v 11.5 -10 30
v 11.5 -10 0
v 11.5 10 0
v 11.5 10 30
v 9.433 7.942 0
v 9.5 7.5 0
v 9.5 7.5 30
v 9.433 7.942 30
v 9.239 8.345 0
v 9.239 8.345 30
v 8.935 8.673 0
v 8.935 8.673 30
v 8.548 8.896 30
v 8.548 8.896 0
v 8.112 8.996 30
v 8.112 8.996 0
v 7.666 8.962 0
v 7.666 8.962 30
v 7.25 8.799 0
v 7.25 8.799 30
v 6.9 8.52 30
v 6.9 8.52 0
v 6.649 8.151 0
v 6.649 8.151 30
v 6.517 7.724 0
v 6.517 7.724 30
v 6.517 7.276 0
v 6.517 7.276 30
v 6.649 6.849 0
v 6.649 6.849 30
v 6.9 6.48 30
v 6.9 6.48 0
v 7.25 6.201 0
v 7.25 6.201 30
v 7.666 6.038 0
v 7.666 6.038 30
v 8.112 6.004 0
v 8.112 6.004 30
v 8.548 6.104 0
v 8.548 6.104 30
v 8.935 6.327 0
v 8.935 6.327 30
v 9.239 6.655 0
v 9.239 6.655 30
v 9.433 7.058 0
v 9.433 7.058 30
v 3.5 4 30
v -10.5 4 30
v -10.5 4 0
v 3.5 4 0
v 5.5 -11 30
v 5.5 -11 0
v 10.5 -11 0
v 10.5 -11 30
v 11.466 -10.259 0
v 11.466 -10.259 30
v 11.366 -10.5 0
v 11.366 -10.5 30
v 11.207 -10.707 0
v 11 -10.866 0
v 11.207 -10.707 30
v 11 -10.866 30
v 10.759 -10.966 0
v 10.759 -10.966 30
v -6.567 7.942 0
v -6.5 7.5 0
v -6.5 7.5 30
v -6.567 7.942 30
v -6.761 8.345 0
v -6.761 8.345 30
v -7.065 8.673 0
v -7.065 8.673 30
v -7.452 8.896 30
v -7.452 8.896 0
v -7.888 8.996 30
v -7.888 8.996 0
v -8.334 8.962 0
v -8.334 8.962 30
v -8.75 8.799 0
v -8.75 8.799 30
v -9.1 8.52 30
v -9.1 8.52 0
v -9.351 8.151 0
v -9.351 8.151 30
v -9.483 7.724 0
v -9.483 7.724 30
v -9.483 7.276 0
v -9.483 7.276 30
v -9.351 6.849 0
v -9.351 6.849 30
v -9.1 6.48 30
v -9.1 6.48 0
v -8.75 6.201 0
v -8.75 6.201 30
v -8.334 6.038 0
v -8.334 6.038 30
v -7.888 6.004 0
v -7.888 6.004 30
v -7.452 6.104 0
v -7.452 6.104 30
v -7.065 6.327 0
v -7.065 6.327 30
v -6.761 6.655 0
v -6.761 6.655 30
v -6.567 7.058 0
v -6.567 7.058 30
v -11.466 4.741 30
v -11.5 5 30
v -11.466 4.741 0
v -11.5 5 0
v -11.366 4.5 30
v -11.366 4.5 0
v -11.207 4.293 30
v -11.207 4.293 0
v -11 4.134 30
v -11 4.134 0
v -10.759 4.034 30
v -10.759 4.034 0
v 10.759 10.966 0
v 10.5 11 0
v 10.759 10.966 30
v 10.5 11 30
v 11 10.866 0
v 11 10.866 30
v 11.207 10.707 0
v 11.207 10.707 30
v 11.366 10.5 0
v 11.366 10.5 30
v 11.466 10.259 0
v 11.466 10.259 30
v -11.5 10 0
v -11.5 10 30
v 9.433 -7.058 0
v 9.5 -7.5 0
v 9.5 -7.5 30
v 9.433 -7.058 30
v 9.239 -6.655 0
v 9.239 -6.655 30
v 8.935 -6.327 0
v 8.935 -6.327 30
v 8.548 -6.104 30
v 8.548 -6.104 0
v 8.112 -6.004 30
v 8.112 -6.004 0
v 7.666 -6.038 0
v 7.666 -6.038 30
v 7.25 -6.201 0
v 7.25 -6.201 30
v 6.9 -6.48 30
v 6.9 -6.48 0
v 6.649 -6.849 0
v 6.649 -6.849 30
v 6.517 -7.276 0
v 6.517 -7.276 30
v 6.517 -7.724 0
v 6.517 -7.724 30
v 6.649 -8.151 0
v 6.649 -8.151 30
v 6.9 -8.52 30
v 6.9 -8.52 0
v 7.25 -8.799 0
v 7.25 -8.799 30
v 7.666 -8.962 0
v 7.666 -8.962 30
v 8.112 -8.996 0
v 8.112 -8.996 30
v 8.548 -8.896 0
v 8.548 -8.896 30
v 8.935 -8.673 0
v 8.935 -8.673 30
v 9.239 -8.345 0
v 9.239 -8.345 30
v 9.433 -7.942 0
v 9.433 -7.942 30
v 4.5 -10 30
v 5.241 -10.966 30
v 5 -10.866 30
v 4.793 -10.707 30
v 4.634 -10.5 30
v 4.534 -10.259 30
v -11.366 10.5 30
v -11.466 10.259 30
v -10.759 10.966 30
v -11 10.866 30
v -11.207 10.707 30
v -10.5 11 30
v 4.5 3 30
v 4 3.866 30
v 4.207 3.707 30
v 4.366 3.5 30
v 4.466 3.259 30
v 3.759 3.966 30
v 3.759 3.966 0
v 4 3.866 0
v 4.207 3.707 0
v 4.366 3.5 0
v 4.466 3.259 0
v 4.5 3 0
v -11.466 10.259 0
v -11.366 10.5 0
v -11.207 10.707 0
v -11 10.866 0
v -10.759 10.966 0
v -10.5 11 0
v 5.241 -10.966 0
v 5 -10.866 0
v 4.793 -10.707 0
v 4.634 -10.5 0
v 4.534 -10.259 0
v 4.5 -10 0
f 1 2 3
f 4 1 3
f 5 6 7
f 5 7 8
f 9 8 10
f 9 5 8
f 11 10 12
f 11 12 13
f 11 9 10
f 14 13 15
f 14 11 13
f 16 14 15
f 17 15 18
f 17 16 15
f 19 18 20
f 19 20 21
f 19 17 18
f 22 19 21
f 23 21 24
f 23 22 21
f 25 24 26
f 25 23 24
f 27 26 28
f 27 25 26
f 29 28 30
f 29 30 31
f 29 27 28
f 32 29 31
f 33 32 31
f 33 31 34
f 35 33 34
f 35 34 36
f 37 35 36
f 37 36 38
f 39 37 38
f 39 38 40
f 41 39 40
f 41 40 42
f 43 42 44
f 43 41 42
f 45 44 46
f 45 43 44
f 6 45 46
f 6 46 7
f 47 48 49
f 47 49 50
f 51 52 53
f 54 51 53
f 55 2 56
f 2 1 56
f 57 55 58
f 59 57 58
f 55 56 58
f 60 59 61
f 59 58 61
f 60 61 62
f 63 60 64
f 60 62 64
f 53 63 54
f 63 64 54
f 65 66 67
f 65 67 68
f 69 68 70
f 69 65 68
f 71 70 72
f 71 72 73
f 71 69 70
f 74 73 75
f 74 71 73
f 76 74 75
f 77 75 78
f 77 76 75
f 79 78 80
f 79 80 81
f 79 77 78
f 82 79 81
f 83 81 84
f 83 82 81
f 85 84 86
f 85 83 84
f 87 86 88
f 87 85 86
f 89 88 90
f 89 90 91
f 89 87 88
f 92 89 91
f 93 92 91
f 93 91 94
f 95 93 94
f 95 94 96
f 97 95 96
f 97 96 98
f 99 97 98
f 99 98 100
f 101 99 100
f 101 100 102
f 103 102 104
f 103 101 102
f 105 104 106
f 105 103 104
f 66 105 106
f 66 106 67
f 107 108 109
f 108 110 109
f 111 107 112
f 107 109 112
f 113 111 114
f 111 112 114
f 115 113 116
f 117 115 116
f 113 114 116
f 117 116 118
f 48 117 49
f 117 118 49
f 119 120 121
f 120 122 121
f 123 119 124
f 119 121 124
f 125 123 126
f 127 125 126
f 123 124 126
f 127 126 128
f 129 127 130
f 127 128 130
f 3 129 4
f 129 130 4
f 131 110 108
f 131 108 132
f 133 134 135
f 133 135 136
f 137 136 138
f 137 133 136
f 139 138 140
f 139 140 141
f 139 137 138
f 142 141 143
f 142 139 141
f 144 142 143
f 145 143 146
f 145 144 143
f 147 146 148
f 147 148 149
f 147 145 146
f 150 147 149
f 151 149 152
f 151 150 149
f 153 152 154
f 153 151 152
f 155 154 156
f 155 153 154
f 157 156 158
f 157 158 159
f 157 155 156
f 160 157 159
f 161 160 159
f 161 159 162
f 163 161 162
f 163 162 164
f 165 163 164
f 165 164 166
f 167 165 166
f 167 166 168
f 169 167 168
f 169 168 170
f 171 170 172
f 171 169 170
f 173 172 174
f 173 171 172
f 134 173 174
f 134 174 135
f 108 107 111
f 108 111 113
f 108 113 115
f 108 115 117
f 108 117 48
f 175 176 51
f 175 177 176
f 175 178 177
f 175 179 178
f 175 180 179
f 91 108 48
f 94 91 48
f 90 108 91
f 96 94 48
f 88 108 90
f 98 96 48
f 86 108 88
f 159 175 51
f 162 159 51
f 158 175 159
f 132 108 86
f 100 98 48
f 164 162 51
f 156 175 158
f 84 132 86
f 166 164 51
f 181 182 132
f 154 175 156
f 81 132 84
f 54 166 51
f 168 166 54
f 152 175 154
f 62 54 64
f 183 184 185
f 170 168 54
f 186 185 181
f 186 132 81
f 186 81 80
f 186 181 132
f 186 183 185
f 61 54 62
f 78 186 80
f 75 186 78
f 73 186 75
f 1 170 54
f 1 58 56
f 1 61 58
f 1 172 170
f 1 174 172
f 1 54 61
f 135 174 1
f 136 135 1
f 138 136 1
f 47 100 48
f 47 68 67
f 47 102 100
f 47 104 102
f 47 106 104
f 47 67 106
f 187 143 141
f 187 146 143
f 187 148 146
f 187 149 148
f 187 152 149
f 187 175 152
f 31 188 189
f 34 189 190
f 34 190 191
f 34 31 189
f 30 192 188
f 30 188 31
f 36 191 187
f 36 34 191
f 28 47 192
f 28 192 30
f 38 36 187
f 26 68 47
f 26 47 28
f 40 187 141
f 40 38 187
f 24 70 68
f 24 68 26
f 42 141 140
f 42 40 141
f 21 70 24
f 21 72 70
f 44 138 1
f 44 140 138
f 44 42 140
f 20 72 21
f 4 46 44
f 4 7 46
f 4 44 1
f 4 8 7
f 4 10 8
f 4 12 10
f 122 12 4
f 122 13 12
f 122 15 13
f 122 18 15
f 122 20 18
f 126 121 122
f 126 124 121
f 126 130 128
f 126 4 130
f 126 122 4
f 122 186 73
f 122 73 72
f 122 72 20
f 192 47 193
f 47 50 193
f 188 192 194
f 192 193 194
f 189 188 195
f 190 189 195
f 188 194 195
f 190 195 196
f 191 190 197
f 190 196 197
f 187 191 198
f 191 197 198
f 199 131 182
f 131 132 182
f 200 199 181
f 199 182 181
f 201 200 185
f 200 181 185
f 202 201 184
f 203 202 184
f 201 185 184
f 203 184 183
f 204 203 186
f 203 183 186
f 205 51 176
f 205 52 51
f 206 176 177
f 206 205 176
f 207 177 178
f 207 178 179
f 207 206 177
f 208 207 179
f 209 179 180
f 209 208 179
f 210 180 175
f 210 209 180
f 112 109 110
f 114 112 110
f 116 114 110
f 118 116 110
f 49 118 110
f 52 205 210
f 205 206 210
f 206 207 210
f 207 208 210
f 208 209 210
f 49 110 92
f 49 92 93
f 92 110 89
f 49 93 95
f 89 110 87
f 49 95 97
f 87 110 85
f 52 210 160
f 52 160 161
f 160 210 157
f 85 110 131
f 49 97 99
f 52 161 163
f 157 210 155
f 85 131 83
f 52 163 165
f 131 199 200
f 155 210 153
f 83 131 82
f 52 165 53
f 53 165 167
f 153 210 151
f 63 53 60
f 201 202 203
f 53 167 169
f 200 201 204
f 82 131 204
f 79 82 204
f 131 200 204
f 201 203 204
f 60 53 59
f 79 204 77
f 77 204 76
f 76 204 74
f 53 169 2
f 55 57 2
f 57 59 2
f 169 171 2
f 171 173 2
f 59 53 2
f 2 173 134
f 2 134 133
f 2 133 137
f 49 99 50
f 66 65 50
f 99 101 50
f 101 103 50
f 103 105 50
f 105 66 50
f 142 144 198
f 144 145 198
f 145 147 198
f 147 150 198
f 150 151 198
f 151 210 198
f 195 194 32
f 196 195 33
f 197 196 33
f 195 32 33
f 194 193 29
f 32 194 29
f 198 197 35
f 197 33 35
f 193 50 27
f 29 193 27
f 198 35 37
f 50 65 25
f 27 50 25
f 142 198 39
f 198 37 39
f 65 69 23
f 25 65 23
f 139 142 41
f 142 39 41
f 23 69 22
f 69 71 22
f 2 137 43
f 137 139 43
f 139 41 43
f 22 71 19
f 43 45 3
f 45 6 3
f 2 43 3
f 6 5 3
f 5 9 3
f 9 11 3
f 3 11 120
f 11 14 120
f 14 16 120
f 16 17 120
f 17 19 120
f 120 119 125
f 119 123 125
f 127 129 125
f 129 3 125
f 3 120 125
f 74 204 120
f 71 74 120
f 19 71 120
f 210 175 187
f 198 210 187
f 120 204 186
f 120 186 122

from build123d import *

# Parameters (mm, degrees)
SKETCH_1_W          = 23
SKETCH_1_H          = 22
SKETCH_1_R          = 1.5
EXTRUDE_1_DEPTH     = 30
SKETCH_2_W          = 16
SKETCH_2_H          = 15
CUT_EXTRUDE_1_DEPTH = 34.959534744
FILLET_1_R          = 1


with BuildPart() as part:
    # 草图1 → 凸台-拉伸1 (new body)
    with BuildSketch(Plane.XY):
        Rectangle(SKETCH_1_W, SKETCH_1_H)
        with Locations((-8, 7.5)):
            Circle(SKETCH_1_R, mode=Mode.SUBTRACT)
        with Locations((8, 7.5)):
            Circle(SKETCH_1_R, mode=Mode.SUBTRACT)
        with Locations((-8, -7.5)):
            Circle(SKETCH_1_R, mode=Mode.SUBTRACT)
        with Locations((8, -7.5)):
            Circle(SKETCH_1_R, mode=Mode.SUBTRACT)
    extrude(amount=EXTRUDE_1_DEPTH)

    # 草图2 → 切除-拉伸1 (cut, through all)
    with BuildSketch(Plane.XY.offset(30)):
        with Locations((-3.5, -3.5)):
            Rectangle(SKETCH_2_W, SKETCH_2_H)
    extrude(amount=-CUT_EXTRUDE_1_DEPTH, mode=Mode.SUBTRACT)

    # 圆角1
    fillet_1_edges = [part.edges().sort_by_distance(p)[0] for p in [
        (-11.5, 4, 15),
        (4.5, 4, 15),
        (4.5, -11, 15),
        (11.5, -11, 15),
        (-11.5, 11, 15),
        (11.5, 11, 15),
    ]]
    fillet(fillet_1_edges, radius=FILLET_1_R)


solid = part.part
